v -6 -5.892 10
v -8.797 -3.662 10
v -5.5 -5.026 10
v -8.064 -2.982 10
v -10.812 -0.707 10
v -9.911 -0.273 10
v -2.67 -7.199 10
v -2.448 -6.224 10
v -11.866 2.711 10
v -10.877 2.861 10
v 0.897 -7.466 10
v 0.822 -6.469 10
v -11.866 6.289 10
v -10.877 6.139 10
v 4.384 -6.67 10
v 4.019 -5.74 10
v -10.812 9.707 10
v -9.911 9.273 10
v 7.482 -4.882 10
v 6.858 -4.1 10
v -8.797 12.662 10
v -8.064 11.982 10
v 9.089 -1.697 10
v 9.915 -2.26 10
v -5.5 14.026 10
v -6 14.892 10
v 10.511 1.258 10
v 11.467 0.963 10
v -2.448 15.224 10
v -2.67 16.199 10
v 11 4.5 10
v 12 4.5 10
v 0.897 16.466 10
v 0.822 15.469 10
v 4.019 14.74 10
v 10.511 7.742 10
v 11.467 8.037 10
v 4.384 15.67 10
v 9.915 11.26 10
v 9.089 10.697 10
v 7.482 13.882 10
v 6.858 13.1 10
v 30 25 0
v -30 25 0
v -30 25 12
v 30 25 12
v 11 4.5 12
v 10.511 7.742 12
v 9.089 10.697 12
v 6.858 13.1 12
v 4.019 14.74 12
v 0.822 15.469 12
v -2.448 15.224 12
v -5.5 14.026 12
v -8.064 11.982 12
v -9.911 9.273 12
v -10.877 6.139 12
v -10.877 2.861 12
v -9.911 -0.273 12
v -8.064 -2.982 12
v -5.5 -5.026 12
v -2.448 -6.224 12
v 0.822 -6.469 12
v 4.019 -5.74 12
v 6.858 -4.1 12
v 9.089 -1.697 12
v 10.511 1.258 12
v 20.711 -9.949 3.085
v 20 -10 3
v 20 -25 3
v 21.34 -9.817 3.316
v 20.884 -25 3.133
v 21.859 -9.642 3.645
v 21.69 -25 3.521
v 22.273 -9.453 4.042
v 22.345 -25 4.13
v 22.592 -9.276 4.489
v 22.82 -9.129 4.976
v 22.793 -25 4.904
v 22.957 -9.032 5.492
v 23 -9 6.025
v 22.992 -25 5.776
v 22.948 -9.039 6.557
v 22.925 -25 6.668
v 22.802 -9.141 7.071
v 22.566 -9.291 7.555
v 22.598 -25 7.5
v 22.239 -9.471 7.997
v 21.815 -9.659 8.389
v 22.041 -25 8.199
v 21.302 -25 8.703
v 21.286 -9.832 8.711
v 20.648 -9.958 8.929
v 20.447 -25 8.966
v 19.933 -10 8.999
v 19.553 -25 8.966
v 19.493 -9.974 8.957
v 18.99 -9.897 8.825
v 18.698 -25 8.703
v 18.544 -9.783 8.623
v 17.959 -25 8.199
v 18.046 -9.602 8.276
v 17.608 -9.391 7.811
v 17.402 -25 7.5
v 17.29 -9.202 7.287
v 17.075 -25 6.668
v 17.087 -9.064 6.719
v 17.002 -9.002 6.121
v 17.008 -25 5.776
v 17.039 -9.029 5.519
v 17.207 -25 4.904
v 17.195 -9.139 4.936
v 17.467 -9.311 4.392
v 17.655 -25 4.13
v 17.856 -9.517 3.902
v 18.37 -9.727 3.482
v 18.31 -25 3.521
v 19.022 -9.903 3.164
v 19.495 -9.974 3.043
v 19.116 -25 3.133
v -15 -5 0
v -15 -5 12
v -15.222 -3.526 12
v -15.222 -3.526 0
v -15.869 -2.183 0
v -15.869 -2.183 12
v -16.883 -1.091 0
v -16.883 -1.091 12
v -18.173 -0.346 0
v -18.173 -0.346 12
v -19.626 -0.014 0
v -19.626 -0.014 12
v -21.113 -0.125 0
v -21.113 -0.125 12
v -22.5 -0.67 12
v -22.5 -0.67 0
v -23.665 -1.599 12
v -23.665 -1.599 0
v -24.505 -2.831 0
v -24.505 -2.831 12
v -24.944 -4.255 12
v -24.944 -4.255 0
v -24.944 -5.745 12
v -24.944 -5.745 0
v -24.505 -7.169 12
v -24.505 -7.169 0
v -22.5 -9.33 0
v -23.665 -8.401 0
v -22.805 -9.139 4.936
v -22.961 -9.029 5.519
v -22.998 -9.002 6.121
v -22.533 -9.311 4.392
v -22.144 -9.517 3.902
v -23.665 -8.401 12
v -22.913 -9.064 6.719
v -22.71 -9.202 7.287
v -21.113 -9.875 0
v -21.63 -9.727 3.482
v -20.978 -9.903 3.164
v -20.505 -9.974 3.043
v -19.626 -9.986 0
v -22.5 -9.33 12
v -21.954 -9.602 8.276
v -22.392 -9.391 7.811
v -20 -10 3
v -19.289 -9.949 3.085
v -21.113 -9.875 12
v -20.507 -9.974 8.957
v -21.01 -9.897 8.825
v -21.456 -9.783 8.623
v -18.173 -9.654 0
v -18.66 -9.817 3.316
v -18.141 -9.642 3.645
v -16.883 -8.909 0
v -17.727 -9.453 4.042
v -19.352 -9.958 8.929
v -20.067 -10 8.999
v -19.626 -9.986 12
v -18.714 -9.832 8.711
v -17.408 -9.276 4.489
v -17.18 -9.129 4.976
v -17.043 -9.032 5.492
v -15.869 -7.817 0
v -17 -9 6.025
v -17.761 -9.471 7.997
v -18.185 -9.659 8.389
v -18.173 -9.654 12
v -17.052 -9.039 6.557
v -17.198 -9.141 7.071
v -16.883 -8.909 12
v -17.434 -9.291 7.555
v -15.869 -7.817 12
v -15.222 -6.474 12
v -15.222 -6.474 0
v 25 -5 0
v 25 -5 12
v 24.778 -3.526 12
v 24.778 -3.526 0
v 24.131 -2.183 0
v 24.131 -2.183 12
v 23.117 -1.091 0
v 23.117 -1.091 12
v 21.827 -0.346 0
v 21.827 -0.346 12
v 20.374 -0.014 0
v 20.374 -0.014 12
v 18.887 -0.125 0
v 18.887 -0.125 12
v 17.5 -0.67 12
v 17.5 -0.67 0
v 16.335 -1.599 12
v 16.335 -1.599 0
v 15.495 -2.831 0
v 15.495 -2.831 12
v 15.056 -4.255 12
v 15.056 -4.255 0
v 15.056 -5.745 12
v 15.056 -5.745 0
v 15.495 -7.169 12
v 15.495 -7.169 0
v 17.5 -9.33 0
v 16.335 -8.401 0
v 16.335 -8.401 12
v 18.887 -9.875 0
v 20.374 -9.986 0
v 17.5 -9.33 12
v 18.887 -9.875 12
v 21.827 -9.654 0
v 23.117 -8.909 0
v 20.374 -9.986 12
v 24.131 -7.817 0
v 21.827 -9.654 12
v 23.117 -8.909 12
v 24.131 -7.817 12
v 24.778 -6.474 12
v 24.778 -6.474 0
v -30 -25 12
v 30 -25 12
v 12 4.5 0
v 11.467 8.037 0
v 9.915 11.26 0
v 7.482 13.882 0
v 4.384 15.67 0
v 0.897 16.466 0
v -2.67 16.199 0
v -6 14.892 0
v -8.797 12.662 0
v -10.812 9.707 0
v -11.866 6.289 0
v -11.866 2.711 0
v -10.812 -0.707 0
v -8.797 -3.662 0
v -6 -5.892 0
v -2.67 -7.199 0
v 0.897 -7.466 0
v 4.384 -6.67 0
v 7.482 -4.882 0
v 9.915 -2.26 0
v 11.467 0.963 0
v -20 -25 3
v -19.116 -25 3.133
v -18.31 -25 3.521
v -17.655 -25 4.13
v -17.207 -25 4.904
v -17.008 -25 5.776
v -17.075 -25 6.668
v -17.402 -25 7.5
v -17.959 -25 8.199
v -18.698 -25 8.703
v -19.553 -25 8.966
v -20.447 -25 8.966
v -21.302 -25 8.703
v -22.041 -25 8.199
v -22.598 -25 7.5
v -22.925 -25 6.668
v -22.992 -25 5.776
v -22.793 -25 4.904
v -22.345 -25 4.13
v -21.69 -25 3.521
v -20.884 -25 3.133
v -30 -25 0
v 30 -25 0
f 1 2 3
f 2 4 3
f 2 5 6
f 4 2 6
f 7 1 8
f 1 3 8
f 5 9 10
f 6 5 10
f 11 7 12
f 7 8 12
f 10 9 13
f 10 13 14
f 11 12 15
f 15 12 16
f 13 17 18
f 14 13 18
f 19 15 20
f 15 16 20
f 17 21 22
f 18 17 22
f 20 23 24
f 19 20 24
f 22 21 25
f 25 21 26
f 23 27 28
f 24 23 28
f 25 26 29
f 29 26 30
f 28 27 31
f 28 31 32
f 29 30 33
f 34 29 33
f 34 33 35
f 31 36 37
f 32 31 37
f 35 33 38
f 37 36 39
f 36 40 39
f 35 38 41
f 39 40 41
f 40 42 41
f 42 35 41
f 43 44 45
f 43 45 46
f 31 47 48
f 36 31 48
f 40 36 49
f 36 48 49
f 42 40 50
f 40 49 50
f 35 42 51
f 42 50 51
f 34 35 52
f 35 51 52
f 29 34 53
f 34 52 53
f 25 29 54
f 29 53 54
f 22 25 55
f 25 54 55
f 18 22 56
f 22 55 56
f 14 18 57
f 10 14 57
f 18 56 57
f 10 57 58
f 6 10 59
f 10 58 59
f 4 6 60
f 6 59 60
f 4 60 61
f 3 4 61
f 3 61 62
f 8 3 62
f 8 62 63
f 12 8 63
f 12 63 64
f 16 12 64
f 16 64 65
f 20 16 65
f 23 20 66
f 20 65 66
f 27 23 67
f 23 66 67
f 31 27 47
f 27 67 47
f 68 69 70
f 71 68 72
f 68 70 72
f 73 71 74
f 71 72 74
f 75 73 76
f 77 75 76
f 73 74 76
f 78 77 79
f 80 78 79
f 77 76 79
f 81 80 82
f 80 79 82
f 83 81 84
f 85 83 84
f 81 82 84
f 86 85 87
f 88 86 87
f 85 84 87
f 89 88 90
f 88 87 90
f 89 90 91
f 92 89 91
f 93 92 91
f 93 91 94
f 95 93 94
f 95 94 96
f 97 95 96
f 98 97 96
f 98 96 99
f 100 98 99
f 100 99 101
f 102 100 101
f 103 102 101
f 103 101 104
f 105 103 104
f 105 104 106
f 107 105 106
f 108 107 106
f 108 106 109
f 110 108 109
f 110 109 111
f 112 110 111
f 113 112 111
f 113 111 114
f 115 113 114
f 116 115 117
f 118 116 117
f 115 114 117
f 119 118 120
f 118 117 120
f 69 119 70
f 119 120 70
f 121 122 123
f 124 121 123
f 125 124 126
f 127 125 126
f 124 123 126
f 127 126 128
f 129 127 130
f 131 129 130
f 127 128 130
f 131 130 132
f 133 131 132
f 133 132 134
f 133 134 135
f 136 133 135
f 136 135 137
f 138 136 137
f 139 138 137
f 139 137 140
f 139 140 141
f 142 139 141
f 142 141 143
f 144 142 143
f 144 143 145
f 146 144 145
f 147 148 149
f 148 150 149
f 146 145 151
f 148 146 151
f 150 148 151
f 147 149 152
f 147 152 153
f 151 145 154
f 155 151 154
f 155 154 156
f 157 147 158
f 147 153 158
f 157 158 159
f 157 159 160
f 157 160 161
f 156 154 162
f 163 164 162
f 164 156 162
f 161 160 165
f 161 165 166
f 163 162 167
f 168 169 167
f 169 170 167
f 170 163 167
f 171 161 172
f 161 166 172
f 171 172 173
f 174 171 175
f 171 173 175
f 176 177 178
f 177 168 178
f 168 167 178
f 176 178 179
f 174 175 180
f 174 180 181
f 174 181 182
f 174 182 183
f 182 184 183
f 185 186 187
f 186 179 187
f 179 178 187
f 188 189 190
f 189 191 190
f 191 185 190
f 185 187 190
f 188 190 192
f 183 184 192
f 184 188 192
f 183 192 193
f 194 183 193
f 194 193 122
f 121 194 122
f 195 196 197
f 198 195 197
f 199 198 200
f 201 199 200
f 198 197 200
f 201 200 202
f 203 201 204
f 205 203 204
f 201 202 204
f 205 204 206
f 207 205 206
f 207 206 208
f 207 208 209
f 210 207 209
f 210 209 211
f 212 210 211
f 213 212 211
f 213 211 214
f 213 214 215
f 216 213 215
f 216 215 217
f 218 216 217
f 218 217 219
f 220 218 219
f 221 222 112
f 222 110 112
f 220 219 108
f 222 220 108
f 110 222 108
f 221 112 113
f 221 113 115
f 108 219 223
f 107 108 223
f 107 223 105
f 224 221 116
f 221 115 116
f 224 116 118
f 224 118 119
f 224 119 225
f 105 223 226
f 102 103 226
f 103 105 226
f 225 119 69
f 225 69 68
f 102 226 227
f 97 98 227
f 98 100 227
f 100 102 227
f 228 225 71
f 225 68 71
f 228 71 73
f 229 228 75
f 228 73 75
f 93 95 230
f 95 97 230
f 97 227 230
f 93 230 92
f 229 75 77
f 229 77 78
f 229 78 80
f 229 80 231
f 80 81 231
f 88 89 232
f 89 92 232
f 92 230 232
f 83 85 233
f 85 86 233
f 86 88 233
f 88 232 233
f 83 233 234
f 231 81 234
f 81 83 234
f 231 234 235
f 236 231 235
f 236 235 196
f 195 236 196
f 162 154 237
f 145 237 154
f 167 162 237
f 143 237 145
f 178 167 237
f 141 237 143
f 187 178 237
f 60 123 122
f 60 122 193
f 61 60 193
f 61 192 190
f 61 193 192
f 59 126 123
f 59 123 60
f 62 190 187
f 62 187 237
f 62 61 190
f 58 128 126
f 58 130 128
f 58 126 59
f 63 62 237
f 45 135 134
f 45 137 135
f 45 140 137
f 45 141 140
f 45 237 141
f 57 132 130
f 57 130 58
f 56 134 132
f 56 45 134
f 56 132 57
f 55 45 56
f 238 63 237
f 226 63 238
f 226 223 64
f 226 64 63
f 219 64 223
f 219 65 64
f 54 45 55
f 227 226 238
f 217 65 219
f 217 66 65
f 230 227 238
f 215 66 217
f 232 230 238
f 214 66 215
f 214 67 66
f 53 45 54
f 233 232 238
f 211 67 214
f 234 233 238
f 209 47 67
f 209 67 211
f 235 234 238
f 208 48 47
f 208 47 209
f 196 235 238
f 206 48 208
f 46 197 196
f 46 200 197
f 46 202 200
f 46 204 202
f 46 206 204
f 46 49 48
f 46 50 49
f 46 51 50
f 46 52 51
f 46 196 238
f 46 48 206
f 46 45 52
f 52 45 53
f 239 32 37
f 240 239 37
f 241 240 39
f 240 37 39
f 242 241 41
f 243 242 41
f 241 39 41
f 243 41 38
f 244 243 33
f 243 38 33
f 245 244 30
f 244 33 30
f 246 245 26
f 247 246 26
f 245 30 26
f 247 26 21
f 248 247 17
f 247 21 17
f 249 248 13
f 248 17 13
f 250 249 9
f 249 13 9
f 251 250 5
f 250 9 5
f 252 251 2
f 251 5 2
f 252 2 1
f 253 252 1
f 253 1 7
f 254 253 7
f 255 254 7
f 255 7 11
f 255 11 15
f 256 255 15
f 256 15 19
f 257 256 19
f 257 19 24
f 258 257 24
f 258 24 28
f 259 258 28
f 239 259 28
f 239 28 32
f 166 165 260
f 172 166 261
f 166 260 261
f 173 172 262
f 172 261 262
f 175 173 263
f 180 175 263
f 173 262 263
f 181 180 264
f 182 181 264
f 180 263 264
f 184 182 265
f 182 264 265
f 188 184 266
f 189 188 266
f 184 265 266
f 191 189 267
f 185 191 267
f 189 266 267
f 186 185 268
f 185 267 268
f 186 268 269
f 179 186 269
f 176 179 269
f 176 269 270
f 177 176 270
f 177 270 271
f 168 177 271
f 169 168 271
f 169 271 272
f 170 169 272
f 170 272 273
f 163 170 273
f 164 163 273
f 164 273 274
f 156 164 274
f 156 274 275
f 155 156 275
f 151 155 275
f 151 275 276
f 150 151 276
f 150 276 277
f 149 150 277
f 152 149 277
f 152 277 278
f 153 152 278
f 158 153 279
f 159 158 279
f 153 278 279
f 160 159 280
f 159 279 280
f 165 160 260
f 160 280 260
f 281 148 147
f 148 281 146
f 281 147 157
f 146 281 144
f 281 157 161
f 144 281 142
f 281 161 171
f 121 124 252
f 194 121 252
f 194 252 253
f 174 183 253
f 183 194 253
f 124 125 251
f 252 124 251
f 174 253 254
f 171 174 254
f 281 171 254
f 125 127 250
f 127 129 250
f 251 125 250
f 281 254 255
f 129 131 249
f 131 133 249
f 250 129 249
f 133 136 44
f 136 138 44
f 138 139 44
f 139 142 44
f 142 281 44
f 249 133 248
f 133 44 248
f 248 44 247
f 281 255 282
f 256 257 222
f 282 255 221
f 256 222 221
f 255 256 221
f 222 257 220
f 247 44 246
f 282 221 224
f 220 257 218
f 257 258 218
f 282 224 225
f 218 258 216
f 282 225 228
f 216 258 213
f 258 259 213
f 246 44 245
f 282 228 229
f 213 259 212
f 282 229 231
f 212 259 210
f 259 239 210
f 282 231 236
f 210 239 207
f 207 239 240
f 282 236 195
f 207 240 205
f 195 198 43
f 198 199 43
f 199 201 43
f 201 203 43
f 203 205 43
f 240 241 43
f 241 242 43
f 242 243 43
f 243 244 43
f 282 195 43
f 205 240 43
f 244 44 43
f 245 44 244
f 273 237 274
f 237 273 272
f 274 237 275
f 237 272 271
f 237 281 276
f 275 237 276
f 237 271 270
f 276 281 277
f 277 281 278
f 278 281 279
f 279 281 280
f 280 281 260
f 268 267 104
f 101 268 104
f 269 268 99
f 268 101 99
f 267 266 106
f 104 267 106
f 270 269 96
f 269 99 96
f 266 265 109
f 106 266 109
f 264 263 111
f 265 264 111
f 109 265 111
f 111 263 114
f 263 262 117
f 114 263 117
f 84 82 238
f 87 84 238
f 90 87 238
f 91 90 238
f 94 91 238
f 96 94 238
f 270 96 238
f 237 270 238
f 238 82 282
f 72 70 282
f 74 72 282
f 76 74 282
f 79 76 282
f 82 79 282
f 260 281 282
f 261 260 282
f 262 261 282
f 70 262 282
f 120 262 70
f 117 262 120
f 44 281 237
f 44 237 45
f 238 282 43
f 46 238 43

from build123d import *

# Parameters (mm, degrees)
SKETCH1_W           = 60
SKETCH1_H           = 50
BOSS_EXTRUDE1_DEPTH = 12
SKETCH2_R           = 11
CUT_EXTRUDE1_DEPTH  = 2
CUT_EXTRUDE2_REACH  = 42.853
SKETCH3_R           = 5
CUT_EXTRUDE3_REACH  = 61.532
SKETCH4_R           = 3
CUT_EXTRUDE5_REACH  = 42.311
SKETCH6_R           = 12


with BuildPart() as part:
    # Sketch1 → Boss-Extrude1 (new body)
    with BuildSketch(Plane.XY):
        Rectangle(SKETCH1_W, SKETCH1_H)
    extrude(amount=BOSS_EXTRUDE1_DEPTH)

    # Sketch2 → Cut-Extrude1 (cut)
    with BuildSketch(Plane.XY.offset(12)):
        with Locations((0, 4.5)):
            Circle(SKETCH2_R)
    extrude(amount=-CUT_EXTRUDE1_DEPTH, mode=Mode.SUBTRACT)

    # Sketch3 → Cut-Extrude2 (cut, up to next)
    with BuildSketch(Plane.XY.offset(12), mode=Mode.PRIVATE) as cut_extrude2_sk1:
        with Locations((-20, -5)):
            Circle(SKETCH3_R)
    cut_extrude2_tool1 = extrude(cut_extrude2_sk1.sketch, amount=-CUT_EXTRUDE2_REACH, mode=Mode.PRIVATE) & part.part
    # Sketch3 → Cut-Extrude2 (cut, up to next)
    with BuildSketch(Plane.XY.offset(12), mode=Mode.PRIVATE) as cut_extrude2_sk2:
        with Locations((20, -5)):
            Circle(SKETCH3_R)
    cut_extrude2_tool2 = extrude(cut_extrude2_sk2.sketch, amount=-CUT_EXTRUDE2_REACH, mode=Mode.PRIVATE) & part.part
    add(cut_extrude2_tool1.solids().sort_by_distance((-20, -5, 12))[0], mode=Mode.SUBTRACT)
    add(cut_extrude2_tool2.solids().sort_by_distance((20, -5, 12))[0], mode=Mode.SUBTRACT)

    # Sketch4 → Cut-Extrude3 (cut, up to next)
    with BuildSketch(Plane.XZ.offset(25), mode=Mode.PRIVATE) as cut_extrude3_sk1:
        with Locations(Location((20, 6, 0), (0, 0, 270))):
            Circle(SKETCH4_R)
    cut_extrude3_tool1 = extrude(cut_extrude3_sk1.sketch, amount=-CUT_EXTRUDE3_REACH, mode=Mode.PRIVATE) & part.part
    # Sketch4 → Cut-Extrude3 (cut, up to next)
    with BuildSketch(Plane.XZ.offset(25), mode=Mode.PRIVATE) as cut_extrude3_sk2:
        with Locations(Location((-20, 6, 0), (0, 0, 270))):
            Circle(SKETCH4_R)
    cut_extrude3_tool2 = extrude(cut_extrude3_sk2.sketch, amount=-CUT_EXTRUDE3_REACH, mode=Mode.PRIVATE) & part.part
    add(cut_extrude3_tool1.solids().sort_by_distance((20, -25, 6))[0], mode=Mode.SUBTRACT)
    add(cut_extrude3_tool2.solids().sort_by_distance((-20, -25, 6))[0], mode=Mode.SUBTRACT)

    # Sketch6 → Cut-Extrude5 (cut, up to next)
    with BuildSketch(Plane.XY.offset(10), mode=Mode.PRIVATE) as cut_extrude5_sk1:
        with Locations((0, 4.5)):
            Circle(SKETCH6_R)
    cut_extrude5_tool1 = extrude(cut_extrude5_sk1.sketch, amount=-CUT_EXTRUDE5_REACH, mode=Mode.PRIVATE) & part.part
    add(cut_extrude5_tool1.solids().sort_by_distance((0, 4.5, 10))[0], mode=Mode.SUBTRACT)


solid = part.part
